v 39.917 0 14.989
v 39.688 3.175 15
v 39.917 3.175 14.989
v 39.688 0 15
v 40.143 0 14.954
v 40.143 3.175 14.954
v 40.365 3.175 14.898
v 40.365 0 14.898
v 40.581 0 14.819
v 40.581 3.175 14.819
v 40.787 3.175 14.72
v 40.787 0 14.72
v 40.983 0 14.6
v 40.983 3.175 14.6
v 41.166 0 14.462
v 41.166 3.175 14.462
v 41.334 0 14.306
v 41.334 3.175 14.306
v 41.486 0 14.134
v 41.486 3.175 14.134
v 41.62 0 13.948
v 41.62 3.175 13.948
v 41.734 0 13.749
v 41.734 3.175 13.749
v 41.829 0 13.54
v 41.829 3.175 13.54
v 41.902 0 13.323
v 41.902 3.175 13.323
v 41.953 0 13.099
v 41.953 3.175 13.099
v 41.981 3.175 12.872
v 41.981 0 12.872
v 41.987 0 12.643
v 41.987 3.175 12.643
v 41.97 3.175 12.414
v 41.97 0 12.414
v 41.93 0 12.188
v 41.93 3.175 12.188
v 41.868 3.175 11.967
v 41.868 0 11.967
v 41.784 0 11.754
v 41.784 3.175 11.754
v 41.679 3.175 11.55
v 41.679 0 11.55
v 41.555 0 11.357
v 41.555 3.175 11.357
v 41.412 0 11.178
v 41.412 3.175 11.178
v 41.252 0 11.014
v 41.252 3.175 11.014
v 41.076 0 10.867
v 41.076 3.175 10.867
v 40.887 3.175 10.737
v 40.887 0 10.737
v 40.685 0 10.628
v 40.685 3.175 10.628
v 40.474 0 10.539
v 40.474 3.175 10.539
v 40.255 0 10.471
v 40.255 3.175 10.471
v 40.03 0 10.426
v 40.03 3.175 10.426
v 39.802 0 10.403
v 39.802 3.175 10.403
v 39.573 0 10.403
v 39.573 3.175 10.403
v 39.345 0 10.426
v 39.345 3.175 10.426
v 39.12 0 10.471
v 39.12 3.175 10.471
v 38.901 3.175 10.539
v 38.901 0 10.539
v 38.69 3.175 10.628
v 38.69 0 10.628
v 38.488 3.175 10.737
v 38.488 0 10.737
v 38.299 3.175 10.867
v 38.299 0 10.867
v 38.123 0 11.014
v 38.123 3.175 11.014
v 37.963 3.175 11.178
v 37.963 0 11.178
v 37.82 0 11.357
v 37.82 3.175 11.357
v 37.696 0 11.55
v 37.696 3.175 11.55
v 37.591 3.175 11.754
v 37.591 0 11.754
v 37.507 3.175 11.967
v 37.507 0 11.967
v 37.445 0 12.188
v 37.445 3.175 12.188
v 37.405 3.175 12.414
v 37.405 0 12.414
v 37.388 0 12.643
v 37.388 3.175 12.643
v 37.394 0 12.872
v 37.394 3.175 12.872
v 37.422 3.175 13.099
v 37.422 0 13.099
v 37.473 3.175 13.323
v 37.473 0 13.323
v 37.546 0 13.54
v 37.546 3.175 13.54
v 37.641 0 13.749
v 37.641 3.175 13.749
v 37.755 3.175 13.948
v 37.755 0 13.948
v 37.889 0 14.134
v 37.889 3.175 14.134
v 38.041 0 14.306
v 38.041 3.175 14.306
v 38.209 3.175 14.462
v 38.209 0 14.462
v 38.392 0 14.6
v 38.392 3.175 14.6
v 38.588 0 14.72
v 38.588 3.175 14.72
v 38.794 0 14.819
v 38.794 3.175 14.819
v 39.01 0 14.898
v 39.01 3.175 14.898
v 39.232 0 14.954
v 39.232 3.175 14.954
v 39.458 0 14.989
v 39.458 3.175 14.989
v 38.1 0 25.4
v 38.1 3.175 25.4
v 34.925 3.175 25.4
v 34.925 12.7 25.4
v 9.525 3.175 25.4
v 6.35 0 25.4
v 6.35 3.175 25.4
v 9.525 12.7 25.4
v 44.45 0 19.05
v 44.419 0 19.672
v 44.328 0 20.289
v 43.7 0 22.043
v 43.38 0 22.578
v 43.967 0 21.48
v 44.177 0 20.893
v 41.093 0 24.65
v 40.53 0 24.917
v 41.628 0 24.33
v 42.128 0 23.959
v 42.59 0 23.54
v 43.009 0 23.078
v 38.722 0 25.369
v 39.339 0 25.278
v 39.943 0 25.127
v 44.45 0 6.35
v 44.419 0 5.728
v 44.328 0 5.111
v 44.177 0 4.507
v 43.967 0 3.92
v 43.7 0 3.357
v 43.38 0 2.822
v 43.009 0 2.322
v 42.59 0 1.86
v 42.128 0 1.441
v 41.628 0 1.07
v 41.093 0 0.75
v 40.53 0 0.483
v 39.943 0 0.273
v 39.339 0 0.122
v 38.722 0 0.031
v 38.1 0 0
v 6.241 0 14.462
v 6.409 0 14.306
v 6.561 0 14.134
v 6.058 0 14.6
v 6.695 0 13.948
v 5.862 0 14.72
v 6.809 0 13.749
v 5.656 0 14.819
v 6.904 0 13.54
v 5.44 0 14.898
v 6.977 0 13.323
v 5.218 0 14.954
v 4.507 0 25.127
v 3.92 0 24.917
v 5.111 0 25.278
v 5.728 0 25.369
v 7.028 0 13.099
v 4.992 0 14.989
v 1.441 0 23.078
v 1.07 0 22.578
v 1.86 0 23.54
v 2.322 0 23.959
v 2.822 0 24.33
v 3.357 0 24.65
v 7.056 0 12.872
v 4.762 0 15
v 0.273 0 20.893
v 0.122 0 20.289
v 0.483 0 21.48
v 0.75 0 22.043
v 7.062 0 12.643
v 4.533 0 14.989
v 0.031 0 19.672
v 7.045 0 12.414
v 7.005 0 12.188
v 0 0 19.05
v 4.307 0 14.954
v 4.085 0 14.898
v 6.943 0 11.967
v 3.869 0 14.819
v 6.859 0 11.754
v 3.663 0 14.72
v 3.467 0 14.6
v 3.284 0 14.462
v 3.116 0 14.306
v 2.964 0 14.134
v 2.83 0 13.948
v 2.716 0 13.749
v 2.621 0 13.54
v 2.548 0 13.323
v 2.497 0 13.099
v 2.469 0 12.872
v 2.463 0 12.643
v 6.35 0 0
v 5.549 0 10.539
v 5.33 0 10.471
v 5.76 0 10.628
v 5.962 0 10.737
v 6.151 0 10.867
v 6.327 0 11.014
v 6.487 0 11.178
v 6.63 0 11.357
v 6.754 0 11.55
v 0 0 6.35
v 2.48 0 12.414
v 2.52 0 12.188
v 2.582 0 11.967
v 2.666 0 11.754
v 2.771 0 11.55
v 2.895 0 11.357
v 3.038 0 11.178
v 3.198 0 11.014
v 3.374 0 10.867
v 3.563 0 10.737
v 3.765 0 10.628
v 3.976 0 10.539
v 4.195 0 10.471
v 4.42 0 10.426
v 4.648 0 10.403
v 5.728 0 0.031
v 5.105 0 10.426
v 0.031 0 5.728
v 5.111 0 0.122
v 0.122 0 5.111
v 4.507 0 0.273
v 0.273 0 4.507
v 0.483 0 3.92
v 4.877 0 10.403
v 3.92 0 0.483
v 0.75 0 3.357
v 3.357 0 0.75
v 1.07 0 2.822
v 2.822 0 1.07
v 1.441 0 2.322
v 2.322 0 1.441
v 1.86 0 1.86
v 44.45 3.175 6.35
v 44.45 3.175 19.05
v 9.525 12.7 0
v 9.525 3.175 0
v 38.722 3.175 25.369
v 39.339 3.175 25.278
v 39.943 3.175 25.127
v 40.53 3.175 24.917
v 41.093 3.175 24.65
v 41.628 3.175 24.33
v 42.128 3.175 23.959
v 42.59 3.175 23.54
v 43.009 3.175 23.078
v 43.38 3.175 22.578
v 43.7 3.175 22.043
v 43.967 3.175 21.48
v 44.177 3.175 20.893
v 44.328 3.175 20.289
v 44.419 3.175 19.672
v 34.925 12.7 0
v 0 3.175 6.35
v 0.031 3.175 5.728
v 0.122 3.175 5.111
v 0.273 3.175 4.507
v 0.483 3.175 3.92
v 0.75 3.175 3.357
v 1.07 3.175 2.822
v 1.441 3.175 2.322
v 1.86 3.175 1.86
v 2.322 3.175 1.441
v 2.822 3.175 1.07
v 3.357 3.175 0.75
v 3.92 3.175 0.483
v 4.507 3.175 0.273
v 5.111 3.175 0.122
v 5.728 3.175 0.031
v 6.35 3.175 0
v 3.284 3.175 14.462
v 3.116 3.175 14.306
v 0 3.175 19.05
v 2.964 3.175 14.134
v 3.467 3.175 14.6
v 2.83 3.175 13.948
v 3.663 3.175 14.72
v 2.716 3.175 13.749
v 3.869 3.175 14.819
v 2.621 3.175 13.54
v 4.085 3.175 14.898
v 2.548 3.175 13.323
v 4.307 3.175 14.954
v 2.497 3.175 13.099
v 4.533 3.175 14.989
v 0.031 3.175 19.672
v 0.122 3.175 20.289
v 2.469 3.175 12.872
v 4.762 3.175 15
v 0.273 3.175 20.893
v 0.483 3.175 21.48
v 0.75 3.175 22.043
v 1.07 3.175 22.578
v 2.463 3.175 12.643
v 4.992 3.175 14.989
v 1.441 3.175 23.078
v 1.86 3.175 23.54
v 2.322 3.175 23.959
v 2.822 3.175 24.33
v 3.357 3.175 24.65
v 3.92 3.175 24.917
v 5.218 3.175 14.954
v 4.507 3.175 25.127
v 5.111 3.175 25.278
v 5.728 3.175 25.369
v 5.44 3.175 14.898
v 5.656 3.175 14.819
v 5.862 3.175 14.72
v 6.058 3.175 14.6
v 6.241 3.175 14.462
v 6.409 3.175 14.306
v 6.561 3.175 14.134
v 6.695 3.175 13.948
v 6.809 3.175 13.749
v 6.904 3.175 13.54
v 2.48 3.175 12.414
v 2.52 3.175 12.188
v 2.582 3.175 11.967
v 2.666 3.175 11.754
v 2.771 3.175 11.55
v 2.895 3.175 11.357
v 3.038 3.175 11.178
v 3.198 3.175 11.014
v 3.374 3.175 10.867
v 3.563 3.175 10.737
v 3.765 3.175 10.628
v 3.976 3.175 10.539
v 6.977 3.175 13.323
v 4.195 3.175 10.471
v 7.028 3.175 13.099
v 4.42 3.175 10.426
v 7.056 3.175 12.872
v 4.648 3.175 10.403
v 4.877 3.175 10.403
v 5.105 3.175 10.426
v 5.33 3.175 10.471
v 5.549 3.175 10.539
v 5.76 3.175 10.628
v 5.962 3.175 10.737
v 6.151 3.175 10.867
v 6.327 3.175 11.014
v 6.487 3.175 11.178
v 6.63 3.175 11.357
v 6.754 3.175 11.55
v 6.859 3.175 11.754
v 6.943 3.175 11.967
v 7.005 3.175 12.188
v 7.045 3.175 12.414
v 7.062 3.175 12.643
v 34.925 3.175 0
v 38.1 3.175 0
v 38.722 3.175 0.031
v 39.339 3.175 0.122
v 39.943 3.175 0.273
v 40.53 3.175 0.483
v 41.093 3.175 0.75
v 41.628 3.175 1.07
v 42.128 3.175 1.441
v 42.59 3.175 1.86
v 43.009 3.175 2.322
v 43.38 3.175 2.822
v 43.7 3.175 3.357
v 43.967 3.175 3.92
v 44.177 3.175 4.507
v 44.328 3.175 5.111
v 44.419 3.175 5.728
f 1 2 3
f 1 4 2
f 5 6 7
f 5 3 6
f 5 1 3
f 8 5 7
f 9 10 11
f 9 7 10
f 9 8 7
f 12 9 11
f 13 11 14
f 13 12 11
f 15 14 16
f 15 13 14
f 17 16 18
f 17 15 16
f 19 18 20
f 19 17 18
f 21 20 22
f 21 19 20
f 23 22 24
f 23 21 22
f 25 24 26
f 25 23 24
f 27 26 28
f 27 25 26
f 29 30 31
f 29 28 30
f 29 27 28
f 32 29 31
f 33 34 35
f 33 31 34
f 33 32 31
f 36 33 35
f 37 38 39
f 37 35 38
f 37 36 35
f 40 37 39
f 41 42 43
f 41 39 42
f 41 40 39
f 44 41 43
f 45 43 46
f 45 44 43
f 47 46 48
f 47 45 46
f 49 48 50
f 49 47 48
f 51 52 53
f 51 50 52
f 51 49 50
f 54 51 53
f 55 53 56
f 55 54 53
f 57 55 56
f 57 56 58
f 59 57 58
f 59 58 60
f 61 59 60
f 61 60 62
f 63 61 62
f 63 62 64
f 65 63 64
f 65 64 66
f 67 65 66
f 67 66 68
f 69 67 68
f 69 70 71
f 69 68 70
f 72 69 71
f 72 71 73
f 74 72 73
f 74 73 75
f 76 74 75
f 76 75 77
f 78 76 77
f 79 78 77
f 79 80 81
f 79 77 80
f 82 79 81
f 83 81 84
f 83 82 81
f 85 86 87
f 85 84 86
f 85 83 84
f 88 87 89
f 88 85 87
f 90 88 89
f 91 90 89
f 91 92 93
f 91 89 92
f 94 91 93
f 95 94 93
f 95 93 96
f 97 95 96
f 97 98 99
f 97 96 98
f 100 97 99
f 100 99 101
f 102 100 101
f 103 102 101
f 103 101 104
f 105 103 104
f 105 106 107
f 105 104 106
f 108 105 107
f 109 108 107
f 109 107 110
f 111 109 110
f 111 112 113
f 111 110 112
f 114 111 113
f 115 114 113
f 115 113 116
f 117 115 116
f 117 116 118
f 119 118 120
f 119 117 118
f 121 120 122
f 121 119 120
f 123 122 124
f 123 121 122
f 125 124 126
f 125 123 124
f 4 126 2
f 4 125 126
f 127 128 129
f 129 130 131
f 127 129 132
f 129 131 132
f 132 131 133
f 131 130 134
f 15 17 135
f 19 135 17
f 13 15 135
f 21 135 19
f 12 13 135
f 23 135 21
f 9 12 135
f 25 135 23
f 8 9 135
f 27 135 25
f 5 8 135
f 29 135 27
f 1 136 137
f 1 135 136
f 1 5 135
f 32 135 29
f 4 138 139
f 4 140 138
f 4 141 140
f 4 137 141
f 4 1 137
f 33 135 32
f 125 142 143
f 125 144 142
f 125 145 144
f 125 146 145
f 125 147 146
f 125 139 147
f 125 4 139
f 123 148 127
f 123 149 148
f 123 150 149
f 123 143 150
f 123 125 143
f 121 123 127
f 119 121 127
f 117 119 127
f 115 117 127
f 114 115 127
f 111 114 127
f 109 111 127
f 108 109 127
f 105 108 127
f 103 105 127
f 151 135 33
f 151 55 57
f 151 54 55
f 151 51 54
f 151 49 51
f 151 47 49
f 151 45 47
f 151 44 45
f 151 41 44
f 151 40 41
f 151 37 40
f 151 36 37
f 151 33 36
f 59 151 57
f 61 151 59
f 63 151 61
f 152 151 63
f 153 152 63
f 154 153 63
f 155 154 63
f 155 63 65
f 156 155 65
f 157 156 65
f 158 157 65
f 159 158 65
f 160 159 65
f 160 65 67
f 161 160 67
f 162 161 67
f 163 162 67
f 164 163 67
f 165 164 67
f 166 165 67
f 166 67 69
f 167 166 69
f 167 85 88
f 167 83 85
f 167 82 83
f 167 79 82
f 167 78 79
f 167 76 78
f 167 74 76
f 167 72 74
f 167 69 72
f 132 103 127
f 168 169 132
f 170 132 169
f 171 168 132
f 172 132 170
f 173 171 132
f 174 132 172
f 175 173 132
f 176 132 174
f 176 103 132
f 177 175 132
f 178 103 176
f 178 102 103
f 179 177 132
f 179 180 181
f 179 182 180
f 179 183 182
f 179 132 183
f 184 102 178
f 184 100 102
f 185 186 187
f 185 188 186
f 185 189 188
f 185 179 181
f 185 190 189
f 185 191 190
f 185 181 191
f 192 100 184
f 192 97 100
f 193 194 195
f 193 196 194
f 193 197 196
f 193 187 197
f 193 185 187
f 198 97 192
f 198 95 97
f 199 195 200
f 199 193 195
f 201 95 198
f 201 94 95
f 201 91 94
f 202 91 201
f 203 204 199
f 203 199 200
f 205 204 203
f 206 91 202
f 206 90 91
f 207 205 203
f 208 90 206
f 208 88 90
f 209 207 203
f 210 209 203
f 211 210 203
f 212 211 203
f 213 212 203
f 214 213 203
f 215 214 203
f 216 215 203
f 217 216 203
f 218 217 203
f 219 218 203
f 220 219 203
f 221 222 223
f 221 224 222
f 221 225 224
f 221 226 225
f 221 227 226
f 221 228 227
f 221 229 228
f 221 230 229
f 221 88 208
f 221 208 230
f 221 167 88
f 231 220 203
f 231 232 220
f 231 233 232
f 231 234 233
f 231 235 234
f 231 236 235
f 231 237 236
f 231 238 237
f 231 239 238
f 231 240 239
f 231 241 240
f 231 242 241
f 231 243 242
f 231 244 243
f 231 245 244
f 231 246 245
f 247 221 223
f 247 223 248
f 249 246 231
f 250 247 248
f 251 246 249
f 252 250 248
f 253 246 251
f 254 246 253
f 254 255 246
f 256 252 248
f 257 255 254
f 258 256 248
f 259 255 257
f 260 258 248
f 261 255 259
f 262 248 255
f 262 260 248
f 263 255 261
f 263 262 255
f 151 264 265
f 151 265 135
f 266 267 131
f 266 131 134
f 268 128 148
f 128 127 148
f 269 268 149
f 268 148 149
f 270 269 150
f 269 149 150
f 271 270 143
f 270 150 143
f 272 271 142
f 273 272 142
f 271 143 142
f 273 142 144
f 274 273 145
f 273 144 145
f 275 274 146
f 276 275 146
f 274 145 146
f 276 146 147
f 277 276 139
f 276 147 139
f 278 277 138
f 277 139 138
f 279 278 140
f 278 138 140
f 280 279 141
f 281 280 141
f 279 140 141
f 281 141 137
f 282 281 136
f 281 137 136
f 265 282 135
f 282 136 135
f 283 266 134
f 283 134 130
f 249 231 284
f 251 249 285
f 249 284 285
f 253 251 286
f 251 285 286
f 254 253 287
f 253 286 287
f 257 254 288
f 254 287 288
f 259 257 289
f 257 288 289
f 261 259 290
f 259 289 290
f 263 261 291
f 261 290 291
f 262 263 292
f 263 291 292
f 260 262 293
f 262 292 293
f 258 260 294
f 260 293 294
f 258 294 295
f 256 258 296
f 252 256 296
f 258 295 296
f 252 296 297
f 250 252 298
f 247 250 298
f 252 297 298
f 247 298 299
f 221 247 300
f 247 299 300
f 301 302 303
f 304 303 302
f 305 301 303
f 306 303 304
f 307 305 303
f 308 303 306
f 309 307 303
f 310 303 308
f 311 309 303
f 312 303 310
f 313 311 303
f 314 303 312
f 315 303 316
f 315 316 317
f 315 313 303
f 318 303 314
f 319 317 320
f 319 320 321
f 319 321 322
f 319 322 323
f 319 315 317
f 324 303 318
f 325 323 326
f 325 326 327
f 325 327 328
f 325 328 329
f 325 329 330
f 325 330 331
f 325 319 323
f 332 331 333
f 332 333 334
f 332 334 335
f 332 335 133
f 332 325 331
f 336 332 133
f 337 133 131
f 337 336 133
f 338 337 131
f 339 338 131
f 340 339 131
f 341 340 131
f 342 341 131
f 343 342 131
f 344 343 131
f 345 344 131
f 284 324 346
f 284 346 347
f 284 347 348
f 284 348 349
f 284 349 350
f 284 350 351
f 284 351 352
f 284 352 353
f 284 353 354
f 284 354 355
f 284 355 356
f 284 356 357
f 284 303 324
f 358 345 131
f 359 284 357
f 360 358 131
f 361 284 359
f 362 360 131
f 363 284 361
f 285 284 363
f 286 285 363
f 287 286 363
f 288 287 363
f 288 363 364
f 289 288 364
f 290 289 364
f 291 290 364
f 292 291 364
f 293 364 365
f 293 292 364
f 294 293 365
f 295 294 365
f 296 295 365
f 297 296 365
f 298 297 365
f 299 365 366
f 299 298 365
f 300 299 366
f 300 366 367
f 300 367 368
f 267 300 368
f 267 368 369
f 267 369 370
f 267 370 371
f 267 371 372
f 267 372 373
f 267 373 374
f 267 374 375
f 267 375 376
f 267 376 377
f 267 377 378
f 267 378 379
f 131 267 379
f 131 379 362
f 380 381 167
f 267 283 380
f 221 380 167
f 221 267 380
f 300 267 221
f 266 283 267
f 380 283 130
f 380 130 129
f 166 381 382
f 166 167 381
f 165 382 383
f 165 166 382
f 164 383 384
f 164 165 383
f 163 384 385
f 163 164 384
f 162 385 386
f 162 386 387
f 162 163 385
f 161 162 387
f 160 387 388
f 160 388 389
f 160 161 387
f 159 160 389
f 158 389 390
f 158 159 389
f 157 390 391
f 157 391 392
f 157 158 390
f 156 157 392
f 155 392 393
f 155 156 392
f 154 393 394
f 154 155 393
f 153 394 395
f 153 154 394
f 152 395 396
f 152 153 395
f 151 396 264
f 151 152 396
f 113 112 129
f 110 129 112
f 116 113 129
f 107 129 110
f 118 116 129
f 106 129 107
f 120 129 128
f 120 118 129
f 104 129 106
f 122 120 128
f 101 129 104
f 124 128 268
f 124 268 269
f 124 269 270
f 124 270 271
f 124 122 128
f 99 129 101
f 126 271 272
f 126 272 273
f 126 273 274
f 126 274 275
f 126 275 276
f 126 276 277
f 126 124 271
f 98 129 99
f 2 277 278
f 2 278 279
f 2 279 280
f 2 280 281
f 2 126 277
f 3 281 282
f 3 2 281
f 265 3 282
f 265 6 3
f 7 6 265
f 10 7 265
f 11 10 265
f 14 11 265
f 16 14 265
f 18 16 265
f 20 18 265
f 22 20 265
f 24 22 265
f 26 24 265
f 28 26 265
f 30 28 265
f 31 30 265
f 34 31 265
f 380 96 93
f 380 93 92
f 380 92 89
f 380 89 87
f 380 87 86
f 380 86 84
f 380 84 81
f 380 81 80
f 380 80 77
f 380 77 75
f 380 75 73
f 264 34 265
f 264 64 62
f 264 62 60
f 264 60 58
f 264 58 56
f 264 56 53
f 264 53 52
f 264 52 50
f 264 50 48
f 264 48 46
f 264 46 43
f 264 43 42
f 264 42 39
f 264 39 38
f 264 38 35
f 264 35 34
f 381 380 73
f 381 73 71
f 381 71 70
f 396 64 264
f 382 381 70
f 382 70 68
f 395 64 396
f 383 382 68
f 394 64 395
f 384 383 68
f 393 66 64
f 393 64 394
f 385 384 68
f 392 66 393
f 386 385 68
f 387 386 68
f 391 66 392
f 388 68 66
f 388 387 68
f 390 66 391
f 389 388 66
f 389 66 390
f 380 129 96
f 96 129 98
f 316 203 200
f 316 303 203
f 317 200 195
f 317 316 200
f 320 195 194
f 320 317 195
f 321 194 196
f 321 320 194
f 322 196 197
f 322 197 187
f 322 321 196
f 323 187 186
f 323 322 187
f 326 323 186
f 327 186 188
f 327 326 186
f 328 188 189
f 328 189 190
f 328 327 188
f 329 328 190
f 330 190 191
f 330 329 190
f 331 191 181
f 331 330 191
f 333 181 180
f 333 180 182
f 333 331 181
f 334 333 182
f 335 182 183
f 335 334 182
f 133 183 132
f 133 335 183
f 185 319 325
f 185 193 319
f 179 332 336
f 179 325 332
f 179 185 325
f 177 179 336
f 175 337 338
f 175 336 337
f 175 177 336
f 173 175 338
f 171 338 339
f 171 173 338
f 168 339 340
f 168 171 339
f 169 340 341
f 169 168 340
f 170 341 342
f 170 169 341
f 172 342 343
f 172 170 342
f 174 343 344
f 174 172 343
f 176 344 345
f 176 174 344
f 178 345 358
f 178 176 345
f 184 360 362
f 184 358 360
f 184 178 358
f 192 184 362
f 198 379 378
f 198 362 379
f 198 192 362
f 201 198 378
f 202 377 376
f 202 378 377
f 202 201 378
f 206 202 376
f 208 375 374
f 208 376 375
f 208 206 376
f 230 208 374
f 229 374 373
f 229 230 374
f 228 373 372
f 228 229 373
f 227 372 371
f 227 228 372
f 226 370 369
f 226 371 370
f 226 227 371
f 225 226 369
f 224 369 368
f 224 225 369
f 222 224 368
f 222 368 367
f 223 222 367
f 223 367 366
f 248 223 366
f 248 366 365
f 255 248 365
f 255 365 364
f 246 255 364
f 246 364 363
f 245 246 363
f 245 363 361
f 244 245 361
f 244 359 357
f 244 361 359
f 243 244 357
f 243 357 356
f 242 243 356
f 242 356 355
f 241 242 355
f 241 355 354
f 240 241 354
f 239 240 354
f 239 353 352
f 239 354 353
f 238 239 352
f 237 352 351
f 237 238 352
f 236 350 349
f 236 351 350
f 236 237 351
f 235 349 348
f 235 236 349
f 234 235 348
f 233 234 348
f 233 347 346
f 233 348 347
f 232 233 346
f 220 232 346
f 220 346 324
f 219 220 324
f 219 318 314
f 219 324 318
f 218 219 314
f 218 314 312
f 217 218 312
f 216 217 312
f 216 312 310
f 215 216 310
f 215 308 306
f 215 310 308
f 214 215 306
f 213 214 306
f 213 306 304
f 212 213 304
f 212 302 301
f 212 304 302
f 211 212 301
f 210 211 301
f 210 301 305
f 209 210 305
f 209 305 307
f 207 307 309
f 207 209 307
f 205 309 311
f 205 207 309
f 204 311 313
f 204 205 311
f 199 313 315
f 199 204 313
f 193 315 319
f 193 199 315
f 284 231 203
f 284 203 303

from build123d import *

# Parameters (mm, degrees)
BOSS_EXTRUDE1_DEPTH     = 25.4
CUT_EXTRUDE1_DEPTH      = 53.073871807
CUT_EXTRUDE1_DEPTH_BACK = 53.073871807
SKETCH2_R               = 2.3
FILLET1_R               = 6.35


with BuildPart() as part:
    # Sketch1 → Boss-Extrude1 (new body)
    with BuildSketch(Plane.XY):
        Polygon((0, 0), (0, 3.175), (9.525, 3.175), (9.525, 12.7), (34.925, 12.7), (34.925, 3.175), (44.45, 3.175), (44.45, 0), align=None)
    extrude(amount=BOSS_EXTRUDE1_DEPTH)

    # Sketch2 → Cut-Extrude1 (cut, two sides: drawn at the far end of the back side and taken through both)
    with BuildSketch(Plane(origin=(0, 3.175, 0), x_dir=(1, 0, 0), z_dir=(0, 1, 0)).offset(-CUT_EXTRUDE1_DEPTH_BACK)):
        with Locations(Location((4.7625, -12.7, 0), (0, 0, 270))):
            Circle(SKETCH2_R)
        with Locations(Location((39.6875, -12.7, 0), (0, 0, 270))):
            Circle(SKETCH2_R)
    extrude(amount=CUT_EXTRUDE1_DEPTH + CUT_EXTRUDE1_DEPTH_BACK, mode=Mode.SUBTRACT)

    # Fillet1
    fillet1_edges = [part.edges().sort_by_distance(p)[0] for p in [
        (44.45, 1.5875, 0),
        (0, 1.5875, 25.4),
        (0, 1.5875, 0),
        (44.45, 1.5875, 25.4),
    ]]
    fillet(fillet1_edges, radius=FILLET1_R)


solid = part.part
